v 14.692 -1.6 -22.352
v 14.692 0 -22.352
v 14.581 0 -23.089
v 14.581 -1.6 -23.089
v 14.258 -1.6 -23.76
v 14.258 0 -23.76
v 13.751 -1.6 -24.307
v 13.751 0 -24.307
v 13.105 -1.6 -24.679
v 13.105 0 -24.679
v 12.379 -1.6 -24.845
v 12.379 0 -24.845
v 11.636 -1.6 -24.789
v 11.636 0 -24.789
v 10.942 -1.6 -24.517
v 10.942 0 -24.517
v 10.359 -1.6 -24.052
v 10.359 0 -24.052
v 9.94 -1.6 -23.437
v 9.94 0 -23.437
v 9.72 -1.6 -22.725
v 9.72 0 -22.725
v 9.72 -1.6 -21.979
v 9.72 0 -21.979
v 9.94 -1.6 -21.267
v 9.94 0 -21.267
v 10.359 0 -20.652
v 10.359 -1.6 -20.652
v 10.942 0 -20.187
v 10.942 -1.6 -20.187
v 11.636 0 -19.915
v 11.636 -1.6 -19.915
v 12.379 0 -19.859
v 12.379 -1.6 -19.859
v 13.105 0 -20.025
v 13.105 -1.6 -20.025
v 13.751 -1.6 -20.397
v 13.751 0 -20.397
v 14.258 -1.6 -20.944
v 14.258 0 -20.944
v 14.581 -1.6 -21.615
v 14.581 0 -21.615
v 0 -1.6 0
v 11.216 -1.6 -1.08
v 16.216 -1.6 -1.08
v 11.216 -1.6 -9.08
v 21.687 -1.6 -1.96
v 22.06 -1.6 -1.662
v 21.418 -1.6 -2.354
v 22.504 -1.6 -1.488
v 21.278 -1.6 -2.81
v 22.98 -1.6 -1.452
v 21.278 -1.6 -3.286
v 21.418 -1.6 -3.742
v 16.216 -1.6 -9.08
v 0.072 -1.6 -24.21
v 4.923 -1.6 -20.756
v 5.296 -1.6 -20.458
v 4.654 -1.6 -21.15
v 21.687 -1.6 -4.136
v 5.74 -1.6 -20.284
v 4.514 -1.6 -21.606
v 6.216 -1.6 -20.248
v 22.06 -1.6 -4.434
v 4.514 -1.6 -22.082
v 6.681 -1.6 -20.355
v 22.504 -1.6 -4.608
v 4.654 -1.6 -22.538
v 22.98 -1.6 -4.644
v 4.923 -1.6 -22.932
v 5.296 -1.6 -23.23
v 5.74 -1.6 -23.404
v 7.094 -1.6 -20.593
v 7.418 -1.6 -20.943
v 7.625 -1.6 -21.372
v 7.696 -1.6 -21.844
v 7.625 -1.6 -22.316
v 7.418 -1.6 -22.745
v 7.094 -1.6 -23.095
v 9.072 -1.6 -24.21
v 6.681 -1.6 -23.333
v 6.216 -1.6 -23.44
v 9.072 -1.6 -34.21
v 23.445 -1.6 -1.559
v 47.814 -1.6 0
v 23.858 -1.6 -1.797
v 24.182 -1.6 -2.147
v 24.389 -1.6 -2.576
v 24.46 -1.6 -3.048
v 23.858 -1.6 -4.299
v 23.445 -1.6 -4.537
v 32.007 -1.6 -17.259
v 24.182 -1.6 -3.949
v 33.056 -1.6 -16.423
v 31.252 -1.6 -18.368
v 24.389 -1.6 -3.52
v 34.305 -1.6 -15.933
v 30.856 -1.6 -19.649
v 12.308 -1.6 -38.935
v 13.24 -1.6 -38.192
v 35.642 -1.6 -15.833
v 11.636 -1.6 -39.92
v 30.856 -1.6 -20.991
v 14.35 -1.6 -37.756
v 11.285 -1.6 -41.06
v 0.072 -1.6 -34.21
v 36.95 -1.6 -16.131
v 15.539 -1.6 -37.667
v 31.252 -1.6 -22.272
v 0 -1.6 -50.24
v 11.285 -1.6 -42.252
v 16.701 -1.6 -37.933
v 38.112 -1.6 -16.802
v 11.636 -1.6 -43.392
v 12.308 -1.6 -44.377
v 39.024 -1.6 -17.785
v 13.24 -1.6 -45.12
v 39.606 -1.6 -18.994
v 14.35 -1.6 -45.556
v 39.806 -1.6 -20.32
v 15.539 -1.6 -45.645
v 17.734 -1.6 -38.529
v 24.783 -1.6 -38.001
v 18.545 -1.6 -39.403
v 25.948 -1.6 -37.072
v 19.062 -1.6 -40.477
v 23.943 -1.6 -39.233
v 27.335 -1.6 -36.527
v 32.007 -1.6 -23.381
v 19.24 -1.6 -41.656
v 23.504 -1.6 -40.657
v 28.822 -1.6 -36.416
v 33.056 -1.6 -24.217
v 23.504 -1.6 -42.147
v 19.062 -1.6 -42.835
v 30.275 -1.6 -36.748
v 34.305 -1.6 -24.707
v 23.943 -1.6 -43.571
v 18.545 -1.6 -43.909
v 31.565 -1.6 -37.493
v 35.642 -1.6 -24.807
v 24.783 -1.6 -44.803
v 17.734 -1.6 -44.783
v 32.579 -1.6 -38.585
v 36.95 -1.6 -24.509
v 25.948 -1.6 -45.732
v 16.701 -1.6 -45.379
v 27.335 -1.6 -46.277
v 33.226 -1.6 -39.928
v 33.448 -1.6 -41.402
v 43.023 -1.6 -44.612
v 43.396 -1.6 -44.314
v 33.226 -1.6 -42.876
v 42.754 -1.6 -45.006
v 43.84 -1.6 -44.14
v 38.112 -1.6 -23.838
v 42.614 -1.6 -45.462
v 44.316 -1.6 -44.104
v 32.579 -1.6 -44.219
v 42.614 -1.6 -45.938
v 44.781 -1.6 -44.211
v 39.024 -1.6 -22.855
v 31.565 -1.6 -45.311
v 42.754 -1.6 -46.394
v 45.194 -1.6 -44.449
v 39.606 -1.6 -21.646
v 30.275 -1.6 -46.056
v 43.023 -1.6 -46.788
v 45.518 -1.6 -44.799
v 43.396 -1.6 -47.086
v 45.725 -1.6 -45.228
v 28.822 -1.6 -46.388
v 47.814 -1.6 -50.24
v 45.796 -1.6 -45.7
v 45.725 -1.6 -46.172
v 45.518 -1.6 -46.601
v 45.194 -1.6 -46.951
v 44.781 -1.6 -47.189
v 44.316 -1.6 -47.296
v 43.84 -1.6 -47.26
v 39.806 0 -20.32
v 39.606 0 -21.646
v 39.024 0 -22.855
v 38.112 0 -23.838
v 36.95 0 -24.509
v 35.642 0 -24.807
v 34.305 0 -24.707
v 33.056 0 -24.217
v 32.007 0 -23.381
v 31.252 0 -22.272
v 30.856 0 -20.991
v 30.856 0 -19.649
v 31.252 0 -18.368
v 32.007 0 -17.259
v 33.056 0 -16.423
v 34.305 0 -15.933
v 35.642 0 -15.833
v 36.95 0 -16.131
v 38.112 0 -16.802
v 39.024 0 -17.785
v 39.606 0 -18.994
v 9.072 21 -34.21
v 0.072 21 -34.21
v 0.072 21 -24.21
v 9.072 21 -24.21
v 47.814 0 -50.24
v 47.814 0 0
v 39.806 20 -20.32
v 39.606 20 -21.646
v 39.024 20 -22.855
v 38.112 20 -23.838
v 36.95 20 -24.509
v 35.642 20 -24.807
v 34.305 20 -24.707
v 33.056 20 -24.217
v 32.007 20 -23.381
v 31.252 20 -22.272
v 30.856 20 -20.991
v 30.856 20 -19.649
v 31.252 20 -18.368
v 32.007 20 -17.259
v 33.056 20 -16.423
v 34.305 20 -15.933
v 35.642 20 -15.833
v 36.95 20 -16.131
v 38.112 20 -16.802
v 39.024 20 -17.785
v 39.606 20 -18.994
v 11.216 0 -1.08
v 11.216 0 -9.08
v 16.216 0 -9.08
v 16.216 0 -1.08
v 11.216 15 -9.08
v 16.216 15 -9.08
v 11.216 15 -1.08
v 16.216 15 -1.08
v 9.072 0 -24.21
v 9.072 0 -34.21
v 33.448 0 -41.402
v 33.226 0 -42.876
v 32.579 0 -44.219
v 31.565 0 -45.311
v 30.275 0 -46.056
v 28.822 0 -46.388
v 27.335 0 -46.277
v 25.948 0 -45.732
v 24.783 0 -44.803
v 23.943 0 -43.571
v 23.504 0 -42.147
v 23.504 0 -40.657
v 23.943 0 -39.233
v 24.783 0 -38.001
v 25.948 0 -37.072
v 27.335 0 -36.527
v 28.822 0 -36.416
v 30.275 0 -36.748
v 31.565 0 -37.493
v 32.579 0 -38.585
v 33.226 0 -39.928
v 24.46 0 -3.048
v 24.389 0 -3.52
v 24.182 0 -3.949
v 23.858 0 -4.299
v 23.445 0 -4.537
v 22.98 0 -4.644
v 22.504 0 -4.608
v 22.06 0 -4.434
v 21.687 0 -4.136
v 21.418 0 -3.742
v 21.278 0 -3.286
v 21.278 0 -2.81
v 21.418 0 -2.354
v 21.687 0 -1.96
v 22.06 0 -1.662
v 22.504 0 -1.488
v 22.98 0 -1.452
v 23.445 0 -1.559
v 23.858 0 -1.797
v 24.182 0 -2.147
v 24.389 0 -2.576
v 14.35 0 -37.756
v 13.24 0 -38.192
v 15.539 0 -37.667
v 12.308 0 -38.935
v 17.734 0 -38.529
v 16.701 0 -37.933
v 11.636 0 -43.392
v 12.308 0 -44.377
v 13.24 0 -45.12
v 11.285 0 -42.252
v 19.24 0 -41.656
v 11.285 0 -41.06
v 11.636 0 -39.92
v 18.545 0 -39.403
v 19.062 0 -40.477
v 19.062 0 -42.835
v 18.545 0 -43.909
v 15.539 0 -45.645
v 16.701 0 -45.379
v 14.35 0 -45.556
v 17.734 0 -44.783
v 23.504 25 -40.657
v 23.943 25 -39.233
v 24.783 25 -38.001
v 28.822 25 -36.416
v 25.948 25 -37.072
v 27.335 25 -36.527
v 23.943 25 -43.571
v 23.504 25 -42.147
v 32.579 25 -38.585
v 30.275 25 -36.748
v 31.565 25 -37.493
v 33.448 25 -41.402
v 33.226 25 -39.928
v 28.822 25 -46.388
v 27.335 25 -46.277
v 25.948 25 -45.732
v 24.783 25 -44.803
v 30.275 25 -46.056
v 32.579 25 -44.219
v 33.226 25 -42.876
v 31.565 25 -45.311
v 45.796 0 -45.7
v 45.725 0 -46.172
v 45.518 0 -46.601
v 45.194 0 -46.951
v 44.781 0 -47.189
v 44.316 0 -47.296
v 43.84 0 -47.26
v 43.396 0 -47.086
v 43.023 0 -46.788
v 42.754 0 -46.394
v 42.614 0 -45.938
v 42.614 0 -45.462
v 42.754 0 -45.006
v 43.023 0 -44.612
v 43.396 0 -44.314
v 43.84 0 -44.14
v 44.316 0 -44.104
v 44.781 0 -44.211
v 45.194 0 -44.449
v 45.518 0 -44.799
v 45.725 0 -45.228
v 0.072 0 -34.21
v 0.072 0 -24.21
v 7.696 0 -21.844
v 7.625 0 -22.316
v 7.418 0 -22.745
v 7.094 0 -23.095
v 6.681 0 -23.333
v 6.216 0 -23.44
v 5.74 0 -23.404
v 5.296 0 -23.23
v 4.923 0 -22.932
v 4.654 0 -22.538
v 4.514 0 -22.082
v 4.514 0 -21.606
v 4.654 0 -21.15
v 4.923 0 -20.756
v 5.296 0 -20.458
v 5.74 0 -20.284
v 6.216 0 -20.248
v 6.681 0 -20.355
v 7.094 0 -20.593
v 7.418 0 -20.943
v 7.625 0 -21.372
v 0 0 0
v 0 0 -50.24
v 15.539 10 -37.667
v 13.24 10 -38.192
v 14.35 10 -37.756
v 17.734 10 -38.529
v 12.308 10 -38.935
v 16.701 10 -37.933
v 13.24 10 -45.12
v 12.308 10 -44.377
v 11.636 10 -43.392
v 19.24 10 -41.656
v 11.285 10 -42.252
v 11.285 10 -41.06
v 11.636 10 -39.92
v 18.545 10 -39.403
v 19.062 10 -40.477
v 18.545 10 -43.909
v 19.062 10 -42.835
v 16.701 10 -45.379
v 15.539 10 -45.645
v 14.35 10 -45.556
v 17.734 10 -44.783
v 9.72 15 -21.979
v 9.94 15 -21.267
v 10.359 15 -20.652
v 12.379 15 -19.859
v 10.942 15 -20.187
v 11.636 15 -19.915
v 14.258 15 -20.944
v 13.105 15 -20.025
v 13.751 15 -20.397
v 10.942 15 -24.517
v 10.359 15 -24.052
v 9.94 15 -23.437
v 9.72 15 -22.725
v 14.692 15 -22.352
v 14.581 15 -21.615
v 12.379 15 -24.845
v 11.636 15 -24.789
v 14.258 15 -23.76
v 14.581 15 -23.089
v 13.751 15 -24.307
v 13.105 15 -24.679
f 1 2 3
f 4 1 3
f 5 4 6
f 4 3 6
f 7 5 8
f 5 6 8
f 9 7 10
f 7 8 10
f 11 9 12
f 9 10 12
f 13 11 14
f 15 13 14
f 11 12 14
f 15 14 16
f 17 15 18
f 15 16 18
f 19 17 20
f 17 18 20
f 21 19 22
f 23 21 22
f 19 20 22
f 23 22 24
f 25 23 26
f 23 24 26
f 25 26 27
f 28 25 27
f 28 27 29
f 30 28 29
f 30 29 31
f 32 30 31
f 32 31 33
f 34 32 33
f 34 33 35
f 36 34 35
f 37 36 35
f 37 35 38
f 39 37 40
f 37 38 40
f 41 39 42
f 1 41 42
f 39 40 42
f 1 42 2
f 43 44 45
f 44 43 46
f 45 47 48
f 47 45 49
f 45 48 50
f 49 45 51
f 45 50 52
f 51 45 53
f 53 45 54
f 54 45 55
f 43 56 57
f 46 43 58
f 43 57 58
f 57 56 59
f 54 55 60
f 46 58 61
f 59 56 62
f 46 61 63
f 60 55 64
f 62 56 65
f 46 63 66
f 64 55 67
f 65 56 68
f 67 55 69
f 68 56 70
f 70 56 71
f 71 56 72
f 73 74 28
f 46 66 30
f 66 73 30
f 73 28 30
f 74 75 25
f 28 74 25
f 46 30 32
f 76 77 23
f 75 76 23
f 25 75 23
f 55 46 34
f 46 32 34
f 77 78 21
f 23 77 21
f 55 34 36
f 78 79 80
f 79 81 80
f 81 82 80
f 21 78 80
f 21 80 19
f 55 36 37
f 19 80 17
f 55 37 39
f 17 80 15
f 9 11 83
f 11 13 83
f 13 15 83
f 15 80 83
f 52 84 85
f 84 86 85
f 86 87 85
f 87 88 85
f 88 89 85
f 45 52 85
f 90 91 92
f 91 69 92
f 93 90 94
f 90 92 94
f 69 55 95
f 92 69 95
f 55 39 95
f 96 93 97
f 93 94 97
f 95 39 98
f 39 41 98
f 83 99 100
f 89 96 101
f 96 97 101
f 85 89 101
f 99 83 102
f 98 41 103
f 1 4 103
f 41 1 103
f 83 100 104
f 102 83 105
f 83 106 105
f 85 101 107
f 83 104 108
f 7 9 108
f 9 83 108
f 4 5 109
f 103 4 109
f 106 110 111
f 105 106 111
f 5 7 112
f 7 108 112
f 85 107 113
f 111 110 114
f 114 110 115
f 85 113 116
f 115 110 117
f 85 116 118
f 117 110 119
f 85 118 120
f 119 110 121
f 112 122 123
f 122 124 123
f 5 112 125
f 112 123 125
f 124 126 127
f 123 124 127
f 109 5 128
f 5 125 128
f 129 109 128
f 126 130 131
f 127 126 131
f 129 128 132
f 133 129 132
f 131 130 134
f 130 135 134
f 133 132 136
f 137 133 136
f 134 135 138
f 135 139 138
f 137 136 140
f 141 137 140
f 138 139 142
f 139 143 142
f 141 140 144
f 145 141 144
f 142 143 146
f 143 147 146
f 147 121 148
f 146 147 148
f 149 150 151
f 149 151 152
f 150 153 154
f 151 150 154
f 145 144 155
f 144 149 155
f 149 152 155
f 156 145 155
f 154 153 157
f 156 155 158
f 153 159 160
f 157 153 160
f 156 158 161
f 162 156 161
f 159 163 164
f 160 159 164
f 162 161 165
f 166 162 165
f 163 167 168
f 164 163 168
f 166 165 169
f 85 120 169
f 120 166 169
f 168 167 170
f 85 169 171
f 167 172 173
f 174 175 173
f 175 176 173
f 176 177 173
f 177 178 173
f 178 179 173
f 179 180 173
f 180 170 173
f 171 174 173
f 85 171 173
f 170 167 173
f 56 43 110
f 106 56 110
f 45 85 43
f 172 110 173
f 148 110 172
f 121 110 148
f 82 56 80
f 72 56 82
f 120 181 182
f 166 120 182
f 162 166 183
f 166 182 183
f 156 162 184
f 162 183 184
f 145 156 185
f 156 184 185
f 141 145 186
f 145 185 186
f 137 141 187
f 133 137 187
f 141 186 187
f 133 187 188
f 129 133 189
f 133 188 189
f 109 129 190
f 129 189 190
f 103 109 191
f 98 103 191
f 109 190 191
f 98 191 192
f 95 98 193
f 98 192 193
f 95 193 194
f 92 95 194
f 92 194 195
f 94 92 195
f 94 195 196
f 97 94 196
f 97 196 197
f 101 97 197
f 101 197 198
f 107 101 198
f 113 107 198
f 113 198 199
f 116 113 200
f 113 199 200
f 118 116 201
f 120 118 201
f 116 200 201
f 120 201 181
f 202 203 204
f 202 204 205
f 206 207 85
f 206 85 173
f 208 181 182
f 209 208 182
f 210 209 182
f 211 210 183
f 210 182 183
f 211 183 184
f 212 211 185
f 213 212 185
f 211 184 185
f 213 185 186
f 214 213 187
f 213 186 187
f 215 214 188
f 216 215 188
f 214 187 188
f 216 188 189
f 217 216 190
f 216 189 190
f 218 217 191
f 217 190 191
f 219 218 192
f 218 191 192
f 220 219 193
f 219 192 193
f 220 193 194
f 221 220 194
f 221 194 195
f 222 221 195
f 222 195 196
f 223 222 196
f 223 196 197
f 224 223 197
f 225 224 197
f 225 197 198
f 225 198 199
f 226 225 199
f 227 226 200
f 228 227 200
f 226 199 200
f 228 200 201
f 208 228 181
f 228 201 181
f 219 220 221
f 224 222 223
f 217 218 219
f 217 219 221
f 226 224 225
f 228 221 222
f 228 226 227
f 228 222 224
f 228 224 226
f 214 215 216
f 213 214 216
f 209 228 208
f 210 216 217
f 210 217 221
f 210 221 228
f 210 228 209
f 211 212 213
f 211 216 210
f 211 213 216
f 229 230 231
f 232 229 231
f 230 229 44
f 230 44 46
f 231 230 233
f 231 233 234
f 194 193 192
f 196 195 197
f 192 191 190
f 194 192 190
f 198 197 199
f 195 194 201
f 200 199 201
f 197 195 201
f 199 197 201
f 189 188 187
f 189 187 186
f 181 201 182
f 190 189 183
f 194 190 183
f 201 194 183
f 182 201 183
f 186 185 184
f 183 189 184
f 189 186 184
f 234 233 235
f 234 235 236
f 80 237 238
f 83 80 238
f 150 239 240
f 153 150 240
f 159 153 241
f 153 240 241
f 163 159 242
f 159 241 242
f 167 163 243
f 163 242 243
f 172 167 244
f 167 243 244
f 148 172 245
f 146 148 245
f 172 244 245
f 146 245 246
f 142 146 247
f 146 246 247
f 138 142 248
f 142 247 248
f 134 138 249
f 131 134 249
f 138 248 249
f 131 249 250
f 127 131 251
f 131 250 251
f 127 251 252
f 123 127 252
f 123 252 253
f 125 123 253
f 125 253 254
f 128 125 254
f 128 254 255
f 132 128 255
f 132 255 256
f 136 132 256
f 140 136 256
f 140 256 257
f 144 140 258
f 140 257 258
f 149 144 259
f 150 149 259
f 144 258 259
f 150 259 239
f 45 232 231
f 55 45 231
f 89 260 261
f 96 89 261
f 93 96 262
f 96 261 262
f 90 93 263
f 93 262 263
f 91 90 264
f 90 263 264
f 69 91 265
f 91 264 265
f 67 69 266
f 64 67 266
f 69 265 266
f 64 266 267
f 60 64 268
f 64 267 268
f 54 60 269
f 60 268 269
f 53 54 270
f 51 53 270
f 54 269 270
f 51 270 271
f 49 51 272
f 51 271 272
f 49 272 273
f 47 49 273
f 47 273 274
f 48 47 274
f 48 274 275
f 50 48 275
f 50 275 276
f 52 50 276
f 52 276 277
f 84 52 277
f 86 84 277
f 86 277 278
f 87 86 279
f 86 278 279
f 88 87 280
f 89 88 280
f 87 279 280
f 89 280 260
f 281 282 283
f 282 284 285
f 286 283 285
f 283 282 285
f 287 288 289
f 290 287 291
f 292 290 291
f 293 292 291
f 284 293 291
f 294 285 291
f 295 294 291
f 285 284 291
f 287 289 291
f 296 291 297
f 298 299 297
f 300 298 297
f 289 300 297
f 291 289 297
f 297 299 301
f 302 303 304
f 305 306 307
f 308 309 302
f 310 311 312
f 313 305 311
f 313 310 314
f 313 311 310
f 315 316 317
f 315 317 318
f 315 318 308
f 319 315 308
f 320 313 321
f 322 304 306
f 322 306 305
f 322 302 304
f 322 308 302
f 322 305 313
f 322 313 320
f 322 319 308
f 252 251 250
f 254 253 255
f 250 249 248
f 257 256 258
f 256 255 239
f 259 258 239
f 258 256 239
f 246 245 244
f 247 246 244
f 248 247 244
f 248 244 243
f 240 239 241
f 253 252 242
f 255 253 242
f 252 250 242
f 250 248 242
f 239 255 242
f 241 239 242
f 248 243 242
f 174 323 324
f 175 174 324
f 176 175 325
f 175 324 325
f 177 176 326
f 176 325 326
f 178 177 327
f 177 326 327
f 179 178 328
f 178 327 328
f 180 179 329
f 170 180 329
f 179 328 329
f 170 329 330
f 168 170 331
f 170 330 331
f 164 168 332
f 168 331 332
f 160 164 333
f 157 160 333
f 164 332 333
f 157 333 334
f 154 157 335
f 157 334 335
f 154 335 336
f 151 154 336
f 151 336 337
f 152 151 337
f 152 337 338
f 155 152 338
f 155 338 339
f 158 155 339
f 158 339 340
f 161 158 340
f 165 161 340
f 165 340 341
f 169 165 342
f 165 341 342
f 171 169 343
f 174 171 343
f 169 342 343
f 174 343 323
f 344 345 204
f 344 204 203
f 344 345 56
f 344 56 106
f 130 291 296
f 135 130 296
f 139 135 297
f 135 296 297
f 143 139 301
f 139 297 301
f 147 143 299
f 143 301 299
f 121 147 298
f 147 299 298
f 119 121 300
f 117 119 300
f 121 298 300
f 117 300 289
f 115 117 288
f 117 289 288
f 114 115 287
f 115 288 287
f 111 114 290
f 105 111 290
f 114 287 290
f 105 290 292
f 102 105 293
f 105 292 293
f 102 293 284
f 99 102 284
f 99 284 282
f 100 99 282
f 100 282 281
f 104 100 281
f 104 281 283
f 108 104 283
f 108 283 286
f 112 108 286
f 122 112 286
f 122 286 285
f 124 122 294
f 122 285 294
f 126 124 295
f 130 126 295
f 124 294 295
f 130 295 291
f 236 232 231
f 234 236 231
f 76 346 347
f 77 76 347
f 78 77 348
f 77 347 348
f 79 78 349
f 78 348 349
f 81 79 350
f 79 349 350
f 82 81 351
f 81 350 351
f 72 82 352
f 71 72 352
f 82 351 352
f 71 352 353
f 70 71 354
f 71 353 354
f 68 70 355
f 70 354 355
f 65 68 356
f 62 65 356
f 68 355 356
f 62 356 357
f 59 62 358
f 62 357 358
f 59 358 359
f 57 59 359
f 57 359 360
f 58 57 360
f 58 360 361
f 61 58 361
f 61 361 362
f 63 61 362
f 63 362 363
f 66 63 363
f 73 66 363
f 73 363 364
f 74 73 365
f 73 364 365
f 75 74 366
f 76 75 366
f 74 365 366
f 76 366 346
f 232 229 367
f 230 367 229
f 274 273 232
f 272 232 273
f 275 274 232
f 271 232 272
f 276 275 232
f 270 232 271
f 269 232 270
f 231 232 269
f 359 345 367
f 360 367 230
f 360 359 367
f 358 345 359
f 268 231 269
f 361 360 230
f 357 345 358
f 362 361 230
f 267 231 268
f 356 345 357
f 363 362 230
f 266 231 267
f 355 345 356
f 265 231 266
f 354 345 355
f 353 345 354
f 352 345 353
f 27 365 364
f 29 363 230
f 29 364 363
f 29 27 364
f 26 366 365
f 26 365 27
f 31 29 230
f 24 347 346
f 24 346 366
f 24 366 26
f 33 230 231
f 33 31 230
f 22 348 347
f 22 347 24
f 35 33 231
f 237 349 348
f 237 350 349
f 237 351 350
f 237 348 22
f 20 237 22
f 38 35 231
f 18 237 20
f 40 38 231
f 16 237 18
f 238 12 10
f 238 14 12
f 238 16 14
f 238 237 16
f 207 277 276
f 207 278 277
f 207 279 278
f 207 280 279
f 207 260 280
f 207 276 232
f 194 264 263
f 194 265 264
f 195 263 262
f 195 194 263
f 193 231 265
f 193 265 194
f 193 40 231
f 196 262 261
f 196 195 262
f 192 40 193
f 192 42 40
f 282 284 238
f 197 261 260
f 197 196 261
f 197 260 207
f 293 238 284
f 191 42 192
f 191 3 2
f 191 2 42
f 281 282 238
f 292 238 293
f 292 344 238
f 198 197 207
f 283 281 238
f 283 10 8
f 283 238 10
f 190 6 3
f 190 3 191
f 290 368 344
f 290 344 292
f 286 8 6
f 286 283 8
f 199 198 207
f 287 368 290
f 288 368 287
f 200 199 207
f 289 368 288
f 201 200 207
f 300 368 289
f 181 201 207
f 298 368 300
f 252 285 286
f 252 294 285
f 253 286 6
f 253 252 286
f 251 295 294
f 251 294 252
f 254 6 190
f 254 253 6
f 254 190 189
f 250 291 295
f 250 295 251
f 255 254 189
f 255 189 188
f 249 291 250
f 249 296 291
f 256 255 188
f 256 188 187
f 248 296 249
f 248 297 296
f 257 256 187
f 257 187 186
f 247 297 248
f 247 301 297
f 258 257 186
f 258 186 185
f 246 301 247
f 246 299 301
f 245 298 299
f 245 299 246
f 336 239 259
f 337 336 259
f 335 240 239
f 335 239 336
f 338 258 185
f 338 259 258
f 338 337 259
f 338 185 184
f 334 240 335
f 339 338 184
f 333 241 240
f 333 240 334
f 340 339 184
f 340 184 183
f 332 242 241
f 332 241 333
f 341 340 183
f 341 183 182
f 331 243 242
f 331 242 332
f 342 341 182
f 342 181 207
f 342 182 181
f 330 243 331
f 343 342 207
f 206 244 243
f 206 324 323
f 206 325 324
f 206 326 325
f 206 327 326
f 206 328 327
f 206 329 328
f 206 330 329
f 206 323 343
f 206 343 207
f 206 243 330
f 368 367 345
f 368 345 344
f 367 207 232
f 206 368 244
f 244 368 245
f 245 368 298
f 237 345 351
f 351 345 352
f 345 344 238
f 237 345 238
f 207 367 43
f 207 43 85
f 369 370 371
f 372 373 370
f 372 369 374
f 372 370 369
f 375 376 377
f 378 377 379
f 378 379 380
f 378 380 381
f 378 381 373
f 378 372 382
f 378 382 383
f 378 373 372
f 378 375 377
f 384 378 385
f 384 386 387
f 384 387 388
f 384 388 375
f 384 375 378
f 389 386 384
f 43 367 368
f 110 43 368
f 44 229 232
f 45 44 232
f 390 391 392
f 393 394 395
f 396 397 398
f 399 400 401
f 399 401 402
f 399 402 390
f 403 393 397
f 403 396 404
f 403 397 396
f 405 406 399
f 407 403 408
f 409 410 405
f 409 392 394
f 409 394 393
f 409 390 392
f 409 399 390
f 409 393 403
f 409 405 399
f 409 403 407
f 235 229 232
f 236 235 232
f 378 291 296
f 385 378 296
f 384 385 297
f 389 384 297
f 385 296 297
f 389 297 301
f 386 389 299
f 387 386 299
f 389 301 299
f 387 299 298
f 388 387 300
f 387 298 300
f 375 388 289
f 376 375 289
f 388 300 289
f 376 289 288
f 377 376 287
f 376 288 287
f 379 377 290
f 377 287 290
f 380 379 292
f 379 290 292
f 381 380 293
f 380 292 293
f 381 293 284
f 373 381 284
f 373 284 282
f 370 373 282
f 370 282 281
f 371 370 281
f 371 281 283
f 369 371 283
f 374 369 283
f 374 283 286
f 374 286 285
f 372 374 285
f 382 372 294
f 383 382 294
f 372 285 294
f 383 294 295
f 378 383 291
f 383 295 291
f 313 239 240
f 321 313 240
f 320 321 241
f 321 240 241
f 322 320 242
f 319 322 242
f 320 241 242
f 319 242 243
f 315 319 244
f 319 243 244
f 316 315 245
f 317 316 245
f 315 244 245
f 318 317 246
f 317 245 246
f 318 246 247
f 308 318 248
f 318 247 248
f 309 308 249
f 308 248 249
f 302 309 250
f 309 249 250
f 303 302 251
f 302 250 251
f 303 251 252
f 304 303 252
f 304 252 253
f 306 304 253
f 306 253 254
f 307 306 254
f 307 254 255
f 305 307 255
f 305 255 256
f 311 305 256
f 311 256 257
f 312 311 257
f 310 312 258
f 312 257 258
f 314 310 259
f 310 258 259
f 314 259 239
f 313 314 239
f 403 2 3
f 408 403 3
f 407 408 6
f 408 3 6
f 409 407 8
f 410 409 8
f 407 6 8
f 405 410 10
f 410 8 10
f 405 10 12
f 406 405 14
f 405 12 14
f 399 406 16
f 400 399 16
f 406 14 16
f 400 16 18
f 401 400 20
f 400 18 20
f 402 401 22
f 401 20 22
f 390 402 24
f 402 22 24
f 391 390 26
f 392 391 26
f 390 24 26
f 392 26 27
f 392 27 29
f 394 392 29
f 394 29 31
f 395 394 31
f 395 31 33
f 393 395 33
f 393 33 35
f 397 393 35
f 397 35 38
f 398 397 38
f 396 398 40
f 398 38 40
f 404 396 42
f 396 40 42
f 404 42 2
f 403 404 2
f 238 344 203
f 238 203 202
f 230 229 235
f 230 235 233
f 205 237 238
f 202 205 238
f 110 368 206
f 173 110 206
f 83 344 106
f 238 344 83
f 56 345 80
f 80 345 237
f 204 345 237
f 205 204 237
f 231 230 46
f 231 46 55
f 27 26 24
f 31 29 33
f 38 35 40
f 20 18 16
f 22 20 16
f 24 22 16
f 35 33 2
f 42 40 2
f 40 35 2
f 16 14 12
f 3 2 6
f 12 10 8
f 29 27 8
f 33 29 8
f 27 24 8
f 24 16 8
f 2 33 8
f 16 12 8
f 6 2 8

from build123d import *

# Parameters (mm, degrees)
SKETCH1_R           = 5
BOSS_EXTRUDE3_DEPTH = 25
SKETCH1_7_W         = 9
SKETCH1_7_H         = 10
BOSS_EXTRUDE4_DEPTH = 21
SKETCH1_8_R         = 4.5
BOSS_EXTRUDE5_DEPTH = 20
SKETCH1_9_W         = 5
SKETCH1_9_H         = 8
BOSS_EXTRUDE6_DEPTH = 15
SKETCH1_10_R        = 2.5
BOSS_EXTRUDE7_DEPTH = 15
SKETCH1_11_W        = 47.81426875
SKETCH1_11_H        = 50.24035
SKETCH1_11_R        = 5
SKETCH1_11_R_2      = 4.5
SKETCH1_11_R_3      = 2.5
SKETCH1_11_R_4      = 4
SKETCH1_11_R_5      = 1.6
SKETCH1_11_W_2      = 9
SKETCH1_11_H_2      = 10
SKETCH1_11_W_3      = 5
SKETCH1_11_H_3      = 8
BOSS_EXTRUDE8_DEPTH = 1.6
SKETCH1_12_R        = 4
BOSS_EXTRUDE9_DEPTH = 10


with BuildPart() as part:
    # Sketch1 → Boss-Extrude3 (new body)
    with BuildSketch(Plane(origin=(0, 0, 0), x_dir=(1, 0, 0), z_dir=(0, 1, 0))):
        with Locations((28.448, 41.402)):
            Circle(SKETCH1_R)
    extrude(amount=BOSS_EXTRUDE3_DEPTH)


with BuildPart() as body_2:
    # Sketch1<7> → Boss-Extrude4 (new body)
    with BuildSketch(Plane(origin=(0, 0, 0), x_dir=(1, 0, 0), z_dir=(0, 1, 0))):
        with Locations((4.572, 29.21)):
            Rectangle(SKETCH1_7_W, SKETCH1_7_H)
    extrude(amount=BOSS_EXTRUDE4_DEPTH)


with BuildPart() as body_3:
    # Sketch1<8> → Boss-Extrude5 (new body)
    with BuildSketch(Plane(origin=(0, 0, 0), x_dir=(1, 0, 0), z_dir=(0, 1, 0))):
        with Locations((35.306, 20.32)):
            Circle(SKETCH1_8_R)
    extrude(amount=BOSS_EXTRUDE5_DEPTH)


with BuildPart() as body_4:
    # Sketch1<9> → Boss-Extrude6 (new body)
    with BuildSketch(Plane(origin=(0, 0, 0), x_dir=(1, 0, 0), z_dir=(0, 1, 0))):
        with Locations((13.716, 5.08)):
            Rectangle(SKETCH1_9_W, SKETCH1_9_H)
    extrude(amount=BOSS_EXTRUDE6_DEPTH)


with BuildPart() as body_5:
    # Sketch1<10> → Boss-Extrude7 (new body)
    with BuildSketch(Plane(origin=(0, 0, 0), x_dir=(1, 0, 0), z_dir=(0, 1, 0))):
        with Locations((12.192, 22.352)):
            Circle(SKETCH1_10_R)
    extrude(amount=BOSS_EXTRUDE7_DEPTH)


with BuildPart() as body_6:
    # Sketch1<11> → Boss-Extrude8 (new body)
    with BuildSketch(Plane(origin=(0, 0, 0), x_dir=(1, 0, 0), z_dir=(0, 1, 0))):
        with Locations((23.907134375, 25.120175)):
            Rectangle(SKETCH1_11_W, SKETCH1_11_H)
        with Locations((28.448, 41.402)):
            Circle(SKETCH1_11_R, mode=Mode.SUBTRACT)
        with Locations((35.306, 20.32)):
            Circle(SKETCH1_11_R_2, mode=Mode.SUBTRACT)
        with Locations((12.192, 22.352)):
            Circle(SKETCH1_11_R_3, mode=Mode.SUBTRACT)
        with Locations((15.24, 41.656)):
            Circle(SKETCH1_11_R_4, mode=Mode.SUBTRACT)
        with Locations((6.096, 21.844)):
            Circle(SKETCH1_11_R_5, mode=Mode.SUBTRACT)
        with Locations((44.196, 45.7)):
            Circle(SKETCH1_11_R_5, mode=Mode.SUBTRACT)
        with Locations((22.86, 3.048)):
            Circle(SKETCH1_11_R_5, mode=Mode.SUBTRACT)
        with Locations((4.572, 29.21)):
            Rectangle(SKETCH1_11_W_2, SKETCH1_11_H_2, mode=Mode.SUBTRACT)
        with Locations((13.716, 5.08)):
            Rectangle(SKETCH1_11_W_3, SKETCH1_11_H_3, mode=Mode.SUBTRACT)
    extrude(amount=-BOSS_EXTRUDE8_DEPTH)


with BuildPart() as body_7:
    # Sketch1<12> → Boss-Extrude9 (new body)
    with BuildSketch(Plane(origin=(0, 0, 0), x_dir=(1, 0, 0), z_dir=(0, 1, 0))):
        with Locations((15.24, 41.656)):
            Circle(SKETCH1_12_R)
    extrude(amount=BOSS_EXTRUDE9_DEPTH)


solid = Compound([part.part, body_2.part, body_3.part, body_4.part, body_5.part, body_6.part, body_7.part])
